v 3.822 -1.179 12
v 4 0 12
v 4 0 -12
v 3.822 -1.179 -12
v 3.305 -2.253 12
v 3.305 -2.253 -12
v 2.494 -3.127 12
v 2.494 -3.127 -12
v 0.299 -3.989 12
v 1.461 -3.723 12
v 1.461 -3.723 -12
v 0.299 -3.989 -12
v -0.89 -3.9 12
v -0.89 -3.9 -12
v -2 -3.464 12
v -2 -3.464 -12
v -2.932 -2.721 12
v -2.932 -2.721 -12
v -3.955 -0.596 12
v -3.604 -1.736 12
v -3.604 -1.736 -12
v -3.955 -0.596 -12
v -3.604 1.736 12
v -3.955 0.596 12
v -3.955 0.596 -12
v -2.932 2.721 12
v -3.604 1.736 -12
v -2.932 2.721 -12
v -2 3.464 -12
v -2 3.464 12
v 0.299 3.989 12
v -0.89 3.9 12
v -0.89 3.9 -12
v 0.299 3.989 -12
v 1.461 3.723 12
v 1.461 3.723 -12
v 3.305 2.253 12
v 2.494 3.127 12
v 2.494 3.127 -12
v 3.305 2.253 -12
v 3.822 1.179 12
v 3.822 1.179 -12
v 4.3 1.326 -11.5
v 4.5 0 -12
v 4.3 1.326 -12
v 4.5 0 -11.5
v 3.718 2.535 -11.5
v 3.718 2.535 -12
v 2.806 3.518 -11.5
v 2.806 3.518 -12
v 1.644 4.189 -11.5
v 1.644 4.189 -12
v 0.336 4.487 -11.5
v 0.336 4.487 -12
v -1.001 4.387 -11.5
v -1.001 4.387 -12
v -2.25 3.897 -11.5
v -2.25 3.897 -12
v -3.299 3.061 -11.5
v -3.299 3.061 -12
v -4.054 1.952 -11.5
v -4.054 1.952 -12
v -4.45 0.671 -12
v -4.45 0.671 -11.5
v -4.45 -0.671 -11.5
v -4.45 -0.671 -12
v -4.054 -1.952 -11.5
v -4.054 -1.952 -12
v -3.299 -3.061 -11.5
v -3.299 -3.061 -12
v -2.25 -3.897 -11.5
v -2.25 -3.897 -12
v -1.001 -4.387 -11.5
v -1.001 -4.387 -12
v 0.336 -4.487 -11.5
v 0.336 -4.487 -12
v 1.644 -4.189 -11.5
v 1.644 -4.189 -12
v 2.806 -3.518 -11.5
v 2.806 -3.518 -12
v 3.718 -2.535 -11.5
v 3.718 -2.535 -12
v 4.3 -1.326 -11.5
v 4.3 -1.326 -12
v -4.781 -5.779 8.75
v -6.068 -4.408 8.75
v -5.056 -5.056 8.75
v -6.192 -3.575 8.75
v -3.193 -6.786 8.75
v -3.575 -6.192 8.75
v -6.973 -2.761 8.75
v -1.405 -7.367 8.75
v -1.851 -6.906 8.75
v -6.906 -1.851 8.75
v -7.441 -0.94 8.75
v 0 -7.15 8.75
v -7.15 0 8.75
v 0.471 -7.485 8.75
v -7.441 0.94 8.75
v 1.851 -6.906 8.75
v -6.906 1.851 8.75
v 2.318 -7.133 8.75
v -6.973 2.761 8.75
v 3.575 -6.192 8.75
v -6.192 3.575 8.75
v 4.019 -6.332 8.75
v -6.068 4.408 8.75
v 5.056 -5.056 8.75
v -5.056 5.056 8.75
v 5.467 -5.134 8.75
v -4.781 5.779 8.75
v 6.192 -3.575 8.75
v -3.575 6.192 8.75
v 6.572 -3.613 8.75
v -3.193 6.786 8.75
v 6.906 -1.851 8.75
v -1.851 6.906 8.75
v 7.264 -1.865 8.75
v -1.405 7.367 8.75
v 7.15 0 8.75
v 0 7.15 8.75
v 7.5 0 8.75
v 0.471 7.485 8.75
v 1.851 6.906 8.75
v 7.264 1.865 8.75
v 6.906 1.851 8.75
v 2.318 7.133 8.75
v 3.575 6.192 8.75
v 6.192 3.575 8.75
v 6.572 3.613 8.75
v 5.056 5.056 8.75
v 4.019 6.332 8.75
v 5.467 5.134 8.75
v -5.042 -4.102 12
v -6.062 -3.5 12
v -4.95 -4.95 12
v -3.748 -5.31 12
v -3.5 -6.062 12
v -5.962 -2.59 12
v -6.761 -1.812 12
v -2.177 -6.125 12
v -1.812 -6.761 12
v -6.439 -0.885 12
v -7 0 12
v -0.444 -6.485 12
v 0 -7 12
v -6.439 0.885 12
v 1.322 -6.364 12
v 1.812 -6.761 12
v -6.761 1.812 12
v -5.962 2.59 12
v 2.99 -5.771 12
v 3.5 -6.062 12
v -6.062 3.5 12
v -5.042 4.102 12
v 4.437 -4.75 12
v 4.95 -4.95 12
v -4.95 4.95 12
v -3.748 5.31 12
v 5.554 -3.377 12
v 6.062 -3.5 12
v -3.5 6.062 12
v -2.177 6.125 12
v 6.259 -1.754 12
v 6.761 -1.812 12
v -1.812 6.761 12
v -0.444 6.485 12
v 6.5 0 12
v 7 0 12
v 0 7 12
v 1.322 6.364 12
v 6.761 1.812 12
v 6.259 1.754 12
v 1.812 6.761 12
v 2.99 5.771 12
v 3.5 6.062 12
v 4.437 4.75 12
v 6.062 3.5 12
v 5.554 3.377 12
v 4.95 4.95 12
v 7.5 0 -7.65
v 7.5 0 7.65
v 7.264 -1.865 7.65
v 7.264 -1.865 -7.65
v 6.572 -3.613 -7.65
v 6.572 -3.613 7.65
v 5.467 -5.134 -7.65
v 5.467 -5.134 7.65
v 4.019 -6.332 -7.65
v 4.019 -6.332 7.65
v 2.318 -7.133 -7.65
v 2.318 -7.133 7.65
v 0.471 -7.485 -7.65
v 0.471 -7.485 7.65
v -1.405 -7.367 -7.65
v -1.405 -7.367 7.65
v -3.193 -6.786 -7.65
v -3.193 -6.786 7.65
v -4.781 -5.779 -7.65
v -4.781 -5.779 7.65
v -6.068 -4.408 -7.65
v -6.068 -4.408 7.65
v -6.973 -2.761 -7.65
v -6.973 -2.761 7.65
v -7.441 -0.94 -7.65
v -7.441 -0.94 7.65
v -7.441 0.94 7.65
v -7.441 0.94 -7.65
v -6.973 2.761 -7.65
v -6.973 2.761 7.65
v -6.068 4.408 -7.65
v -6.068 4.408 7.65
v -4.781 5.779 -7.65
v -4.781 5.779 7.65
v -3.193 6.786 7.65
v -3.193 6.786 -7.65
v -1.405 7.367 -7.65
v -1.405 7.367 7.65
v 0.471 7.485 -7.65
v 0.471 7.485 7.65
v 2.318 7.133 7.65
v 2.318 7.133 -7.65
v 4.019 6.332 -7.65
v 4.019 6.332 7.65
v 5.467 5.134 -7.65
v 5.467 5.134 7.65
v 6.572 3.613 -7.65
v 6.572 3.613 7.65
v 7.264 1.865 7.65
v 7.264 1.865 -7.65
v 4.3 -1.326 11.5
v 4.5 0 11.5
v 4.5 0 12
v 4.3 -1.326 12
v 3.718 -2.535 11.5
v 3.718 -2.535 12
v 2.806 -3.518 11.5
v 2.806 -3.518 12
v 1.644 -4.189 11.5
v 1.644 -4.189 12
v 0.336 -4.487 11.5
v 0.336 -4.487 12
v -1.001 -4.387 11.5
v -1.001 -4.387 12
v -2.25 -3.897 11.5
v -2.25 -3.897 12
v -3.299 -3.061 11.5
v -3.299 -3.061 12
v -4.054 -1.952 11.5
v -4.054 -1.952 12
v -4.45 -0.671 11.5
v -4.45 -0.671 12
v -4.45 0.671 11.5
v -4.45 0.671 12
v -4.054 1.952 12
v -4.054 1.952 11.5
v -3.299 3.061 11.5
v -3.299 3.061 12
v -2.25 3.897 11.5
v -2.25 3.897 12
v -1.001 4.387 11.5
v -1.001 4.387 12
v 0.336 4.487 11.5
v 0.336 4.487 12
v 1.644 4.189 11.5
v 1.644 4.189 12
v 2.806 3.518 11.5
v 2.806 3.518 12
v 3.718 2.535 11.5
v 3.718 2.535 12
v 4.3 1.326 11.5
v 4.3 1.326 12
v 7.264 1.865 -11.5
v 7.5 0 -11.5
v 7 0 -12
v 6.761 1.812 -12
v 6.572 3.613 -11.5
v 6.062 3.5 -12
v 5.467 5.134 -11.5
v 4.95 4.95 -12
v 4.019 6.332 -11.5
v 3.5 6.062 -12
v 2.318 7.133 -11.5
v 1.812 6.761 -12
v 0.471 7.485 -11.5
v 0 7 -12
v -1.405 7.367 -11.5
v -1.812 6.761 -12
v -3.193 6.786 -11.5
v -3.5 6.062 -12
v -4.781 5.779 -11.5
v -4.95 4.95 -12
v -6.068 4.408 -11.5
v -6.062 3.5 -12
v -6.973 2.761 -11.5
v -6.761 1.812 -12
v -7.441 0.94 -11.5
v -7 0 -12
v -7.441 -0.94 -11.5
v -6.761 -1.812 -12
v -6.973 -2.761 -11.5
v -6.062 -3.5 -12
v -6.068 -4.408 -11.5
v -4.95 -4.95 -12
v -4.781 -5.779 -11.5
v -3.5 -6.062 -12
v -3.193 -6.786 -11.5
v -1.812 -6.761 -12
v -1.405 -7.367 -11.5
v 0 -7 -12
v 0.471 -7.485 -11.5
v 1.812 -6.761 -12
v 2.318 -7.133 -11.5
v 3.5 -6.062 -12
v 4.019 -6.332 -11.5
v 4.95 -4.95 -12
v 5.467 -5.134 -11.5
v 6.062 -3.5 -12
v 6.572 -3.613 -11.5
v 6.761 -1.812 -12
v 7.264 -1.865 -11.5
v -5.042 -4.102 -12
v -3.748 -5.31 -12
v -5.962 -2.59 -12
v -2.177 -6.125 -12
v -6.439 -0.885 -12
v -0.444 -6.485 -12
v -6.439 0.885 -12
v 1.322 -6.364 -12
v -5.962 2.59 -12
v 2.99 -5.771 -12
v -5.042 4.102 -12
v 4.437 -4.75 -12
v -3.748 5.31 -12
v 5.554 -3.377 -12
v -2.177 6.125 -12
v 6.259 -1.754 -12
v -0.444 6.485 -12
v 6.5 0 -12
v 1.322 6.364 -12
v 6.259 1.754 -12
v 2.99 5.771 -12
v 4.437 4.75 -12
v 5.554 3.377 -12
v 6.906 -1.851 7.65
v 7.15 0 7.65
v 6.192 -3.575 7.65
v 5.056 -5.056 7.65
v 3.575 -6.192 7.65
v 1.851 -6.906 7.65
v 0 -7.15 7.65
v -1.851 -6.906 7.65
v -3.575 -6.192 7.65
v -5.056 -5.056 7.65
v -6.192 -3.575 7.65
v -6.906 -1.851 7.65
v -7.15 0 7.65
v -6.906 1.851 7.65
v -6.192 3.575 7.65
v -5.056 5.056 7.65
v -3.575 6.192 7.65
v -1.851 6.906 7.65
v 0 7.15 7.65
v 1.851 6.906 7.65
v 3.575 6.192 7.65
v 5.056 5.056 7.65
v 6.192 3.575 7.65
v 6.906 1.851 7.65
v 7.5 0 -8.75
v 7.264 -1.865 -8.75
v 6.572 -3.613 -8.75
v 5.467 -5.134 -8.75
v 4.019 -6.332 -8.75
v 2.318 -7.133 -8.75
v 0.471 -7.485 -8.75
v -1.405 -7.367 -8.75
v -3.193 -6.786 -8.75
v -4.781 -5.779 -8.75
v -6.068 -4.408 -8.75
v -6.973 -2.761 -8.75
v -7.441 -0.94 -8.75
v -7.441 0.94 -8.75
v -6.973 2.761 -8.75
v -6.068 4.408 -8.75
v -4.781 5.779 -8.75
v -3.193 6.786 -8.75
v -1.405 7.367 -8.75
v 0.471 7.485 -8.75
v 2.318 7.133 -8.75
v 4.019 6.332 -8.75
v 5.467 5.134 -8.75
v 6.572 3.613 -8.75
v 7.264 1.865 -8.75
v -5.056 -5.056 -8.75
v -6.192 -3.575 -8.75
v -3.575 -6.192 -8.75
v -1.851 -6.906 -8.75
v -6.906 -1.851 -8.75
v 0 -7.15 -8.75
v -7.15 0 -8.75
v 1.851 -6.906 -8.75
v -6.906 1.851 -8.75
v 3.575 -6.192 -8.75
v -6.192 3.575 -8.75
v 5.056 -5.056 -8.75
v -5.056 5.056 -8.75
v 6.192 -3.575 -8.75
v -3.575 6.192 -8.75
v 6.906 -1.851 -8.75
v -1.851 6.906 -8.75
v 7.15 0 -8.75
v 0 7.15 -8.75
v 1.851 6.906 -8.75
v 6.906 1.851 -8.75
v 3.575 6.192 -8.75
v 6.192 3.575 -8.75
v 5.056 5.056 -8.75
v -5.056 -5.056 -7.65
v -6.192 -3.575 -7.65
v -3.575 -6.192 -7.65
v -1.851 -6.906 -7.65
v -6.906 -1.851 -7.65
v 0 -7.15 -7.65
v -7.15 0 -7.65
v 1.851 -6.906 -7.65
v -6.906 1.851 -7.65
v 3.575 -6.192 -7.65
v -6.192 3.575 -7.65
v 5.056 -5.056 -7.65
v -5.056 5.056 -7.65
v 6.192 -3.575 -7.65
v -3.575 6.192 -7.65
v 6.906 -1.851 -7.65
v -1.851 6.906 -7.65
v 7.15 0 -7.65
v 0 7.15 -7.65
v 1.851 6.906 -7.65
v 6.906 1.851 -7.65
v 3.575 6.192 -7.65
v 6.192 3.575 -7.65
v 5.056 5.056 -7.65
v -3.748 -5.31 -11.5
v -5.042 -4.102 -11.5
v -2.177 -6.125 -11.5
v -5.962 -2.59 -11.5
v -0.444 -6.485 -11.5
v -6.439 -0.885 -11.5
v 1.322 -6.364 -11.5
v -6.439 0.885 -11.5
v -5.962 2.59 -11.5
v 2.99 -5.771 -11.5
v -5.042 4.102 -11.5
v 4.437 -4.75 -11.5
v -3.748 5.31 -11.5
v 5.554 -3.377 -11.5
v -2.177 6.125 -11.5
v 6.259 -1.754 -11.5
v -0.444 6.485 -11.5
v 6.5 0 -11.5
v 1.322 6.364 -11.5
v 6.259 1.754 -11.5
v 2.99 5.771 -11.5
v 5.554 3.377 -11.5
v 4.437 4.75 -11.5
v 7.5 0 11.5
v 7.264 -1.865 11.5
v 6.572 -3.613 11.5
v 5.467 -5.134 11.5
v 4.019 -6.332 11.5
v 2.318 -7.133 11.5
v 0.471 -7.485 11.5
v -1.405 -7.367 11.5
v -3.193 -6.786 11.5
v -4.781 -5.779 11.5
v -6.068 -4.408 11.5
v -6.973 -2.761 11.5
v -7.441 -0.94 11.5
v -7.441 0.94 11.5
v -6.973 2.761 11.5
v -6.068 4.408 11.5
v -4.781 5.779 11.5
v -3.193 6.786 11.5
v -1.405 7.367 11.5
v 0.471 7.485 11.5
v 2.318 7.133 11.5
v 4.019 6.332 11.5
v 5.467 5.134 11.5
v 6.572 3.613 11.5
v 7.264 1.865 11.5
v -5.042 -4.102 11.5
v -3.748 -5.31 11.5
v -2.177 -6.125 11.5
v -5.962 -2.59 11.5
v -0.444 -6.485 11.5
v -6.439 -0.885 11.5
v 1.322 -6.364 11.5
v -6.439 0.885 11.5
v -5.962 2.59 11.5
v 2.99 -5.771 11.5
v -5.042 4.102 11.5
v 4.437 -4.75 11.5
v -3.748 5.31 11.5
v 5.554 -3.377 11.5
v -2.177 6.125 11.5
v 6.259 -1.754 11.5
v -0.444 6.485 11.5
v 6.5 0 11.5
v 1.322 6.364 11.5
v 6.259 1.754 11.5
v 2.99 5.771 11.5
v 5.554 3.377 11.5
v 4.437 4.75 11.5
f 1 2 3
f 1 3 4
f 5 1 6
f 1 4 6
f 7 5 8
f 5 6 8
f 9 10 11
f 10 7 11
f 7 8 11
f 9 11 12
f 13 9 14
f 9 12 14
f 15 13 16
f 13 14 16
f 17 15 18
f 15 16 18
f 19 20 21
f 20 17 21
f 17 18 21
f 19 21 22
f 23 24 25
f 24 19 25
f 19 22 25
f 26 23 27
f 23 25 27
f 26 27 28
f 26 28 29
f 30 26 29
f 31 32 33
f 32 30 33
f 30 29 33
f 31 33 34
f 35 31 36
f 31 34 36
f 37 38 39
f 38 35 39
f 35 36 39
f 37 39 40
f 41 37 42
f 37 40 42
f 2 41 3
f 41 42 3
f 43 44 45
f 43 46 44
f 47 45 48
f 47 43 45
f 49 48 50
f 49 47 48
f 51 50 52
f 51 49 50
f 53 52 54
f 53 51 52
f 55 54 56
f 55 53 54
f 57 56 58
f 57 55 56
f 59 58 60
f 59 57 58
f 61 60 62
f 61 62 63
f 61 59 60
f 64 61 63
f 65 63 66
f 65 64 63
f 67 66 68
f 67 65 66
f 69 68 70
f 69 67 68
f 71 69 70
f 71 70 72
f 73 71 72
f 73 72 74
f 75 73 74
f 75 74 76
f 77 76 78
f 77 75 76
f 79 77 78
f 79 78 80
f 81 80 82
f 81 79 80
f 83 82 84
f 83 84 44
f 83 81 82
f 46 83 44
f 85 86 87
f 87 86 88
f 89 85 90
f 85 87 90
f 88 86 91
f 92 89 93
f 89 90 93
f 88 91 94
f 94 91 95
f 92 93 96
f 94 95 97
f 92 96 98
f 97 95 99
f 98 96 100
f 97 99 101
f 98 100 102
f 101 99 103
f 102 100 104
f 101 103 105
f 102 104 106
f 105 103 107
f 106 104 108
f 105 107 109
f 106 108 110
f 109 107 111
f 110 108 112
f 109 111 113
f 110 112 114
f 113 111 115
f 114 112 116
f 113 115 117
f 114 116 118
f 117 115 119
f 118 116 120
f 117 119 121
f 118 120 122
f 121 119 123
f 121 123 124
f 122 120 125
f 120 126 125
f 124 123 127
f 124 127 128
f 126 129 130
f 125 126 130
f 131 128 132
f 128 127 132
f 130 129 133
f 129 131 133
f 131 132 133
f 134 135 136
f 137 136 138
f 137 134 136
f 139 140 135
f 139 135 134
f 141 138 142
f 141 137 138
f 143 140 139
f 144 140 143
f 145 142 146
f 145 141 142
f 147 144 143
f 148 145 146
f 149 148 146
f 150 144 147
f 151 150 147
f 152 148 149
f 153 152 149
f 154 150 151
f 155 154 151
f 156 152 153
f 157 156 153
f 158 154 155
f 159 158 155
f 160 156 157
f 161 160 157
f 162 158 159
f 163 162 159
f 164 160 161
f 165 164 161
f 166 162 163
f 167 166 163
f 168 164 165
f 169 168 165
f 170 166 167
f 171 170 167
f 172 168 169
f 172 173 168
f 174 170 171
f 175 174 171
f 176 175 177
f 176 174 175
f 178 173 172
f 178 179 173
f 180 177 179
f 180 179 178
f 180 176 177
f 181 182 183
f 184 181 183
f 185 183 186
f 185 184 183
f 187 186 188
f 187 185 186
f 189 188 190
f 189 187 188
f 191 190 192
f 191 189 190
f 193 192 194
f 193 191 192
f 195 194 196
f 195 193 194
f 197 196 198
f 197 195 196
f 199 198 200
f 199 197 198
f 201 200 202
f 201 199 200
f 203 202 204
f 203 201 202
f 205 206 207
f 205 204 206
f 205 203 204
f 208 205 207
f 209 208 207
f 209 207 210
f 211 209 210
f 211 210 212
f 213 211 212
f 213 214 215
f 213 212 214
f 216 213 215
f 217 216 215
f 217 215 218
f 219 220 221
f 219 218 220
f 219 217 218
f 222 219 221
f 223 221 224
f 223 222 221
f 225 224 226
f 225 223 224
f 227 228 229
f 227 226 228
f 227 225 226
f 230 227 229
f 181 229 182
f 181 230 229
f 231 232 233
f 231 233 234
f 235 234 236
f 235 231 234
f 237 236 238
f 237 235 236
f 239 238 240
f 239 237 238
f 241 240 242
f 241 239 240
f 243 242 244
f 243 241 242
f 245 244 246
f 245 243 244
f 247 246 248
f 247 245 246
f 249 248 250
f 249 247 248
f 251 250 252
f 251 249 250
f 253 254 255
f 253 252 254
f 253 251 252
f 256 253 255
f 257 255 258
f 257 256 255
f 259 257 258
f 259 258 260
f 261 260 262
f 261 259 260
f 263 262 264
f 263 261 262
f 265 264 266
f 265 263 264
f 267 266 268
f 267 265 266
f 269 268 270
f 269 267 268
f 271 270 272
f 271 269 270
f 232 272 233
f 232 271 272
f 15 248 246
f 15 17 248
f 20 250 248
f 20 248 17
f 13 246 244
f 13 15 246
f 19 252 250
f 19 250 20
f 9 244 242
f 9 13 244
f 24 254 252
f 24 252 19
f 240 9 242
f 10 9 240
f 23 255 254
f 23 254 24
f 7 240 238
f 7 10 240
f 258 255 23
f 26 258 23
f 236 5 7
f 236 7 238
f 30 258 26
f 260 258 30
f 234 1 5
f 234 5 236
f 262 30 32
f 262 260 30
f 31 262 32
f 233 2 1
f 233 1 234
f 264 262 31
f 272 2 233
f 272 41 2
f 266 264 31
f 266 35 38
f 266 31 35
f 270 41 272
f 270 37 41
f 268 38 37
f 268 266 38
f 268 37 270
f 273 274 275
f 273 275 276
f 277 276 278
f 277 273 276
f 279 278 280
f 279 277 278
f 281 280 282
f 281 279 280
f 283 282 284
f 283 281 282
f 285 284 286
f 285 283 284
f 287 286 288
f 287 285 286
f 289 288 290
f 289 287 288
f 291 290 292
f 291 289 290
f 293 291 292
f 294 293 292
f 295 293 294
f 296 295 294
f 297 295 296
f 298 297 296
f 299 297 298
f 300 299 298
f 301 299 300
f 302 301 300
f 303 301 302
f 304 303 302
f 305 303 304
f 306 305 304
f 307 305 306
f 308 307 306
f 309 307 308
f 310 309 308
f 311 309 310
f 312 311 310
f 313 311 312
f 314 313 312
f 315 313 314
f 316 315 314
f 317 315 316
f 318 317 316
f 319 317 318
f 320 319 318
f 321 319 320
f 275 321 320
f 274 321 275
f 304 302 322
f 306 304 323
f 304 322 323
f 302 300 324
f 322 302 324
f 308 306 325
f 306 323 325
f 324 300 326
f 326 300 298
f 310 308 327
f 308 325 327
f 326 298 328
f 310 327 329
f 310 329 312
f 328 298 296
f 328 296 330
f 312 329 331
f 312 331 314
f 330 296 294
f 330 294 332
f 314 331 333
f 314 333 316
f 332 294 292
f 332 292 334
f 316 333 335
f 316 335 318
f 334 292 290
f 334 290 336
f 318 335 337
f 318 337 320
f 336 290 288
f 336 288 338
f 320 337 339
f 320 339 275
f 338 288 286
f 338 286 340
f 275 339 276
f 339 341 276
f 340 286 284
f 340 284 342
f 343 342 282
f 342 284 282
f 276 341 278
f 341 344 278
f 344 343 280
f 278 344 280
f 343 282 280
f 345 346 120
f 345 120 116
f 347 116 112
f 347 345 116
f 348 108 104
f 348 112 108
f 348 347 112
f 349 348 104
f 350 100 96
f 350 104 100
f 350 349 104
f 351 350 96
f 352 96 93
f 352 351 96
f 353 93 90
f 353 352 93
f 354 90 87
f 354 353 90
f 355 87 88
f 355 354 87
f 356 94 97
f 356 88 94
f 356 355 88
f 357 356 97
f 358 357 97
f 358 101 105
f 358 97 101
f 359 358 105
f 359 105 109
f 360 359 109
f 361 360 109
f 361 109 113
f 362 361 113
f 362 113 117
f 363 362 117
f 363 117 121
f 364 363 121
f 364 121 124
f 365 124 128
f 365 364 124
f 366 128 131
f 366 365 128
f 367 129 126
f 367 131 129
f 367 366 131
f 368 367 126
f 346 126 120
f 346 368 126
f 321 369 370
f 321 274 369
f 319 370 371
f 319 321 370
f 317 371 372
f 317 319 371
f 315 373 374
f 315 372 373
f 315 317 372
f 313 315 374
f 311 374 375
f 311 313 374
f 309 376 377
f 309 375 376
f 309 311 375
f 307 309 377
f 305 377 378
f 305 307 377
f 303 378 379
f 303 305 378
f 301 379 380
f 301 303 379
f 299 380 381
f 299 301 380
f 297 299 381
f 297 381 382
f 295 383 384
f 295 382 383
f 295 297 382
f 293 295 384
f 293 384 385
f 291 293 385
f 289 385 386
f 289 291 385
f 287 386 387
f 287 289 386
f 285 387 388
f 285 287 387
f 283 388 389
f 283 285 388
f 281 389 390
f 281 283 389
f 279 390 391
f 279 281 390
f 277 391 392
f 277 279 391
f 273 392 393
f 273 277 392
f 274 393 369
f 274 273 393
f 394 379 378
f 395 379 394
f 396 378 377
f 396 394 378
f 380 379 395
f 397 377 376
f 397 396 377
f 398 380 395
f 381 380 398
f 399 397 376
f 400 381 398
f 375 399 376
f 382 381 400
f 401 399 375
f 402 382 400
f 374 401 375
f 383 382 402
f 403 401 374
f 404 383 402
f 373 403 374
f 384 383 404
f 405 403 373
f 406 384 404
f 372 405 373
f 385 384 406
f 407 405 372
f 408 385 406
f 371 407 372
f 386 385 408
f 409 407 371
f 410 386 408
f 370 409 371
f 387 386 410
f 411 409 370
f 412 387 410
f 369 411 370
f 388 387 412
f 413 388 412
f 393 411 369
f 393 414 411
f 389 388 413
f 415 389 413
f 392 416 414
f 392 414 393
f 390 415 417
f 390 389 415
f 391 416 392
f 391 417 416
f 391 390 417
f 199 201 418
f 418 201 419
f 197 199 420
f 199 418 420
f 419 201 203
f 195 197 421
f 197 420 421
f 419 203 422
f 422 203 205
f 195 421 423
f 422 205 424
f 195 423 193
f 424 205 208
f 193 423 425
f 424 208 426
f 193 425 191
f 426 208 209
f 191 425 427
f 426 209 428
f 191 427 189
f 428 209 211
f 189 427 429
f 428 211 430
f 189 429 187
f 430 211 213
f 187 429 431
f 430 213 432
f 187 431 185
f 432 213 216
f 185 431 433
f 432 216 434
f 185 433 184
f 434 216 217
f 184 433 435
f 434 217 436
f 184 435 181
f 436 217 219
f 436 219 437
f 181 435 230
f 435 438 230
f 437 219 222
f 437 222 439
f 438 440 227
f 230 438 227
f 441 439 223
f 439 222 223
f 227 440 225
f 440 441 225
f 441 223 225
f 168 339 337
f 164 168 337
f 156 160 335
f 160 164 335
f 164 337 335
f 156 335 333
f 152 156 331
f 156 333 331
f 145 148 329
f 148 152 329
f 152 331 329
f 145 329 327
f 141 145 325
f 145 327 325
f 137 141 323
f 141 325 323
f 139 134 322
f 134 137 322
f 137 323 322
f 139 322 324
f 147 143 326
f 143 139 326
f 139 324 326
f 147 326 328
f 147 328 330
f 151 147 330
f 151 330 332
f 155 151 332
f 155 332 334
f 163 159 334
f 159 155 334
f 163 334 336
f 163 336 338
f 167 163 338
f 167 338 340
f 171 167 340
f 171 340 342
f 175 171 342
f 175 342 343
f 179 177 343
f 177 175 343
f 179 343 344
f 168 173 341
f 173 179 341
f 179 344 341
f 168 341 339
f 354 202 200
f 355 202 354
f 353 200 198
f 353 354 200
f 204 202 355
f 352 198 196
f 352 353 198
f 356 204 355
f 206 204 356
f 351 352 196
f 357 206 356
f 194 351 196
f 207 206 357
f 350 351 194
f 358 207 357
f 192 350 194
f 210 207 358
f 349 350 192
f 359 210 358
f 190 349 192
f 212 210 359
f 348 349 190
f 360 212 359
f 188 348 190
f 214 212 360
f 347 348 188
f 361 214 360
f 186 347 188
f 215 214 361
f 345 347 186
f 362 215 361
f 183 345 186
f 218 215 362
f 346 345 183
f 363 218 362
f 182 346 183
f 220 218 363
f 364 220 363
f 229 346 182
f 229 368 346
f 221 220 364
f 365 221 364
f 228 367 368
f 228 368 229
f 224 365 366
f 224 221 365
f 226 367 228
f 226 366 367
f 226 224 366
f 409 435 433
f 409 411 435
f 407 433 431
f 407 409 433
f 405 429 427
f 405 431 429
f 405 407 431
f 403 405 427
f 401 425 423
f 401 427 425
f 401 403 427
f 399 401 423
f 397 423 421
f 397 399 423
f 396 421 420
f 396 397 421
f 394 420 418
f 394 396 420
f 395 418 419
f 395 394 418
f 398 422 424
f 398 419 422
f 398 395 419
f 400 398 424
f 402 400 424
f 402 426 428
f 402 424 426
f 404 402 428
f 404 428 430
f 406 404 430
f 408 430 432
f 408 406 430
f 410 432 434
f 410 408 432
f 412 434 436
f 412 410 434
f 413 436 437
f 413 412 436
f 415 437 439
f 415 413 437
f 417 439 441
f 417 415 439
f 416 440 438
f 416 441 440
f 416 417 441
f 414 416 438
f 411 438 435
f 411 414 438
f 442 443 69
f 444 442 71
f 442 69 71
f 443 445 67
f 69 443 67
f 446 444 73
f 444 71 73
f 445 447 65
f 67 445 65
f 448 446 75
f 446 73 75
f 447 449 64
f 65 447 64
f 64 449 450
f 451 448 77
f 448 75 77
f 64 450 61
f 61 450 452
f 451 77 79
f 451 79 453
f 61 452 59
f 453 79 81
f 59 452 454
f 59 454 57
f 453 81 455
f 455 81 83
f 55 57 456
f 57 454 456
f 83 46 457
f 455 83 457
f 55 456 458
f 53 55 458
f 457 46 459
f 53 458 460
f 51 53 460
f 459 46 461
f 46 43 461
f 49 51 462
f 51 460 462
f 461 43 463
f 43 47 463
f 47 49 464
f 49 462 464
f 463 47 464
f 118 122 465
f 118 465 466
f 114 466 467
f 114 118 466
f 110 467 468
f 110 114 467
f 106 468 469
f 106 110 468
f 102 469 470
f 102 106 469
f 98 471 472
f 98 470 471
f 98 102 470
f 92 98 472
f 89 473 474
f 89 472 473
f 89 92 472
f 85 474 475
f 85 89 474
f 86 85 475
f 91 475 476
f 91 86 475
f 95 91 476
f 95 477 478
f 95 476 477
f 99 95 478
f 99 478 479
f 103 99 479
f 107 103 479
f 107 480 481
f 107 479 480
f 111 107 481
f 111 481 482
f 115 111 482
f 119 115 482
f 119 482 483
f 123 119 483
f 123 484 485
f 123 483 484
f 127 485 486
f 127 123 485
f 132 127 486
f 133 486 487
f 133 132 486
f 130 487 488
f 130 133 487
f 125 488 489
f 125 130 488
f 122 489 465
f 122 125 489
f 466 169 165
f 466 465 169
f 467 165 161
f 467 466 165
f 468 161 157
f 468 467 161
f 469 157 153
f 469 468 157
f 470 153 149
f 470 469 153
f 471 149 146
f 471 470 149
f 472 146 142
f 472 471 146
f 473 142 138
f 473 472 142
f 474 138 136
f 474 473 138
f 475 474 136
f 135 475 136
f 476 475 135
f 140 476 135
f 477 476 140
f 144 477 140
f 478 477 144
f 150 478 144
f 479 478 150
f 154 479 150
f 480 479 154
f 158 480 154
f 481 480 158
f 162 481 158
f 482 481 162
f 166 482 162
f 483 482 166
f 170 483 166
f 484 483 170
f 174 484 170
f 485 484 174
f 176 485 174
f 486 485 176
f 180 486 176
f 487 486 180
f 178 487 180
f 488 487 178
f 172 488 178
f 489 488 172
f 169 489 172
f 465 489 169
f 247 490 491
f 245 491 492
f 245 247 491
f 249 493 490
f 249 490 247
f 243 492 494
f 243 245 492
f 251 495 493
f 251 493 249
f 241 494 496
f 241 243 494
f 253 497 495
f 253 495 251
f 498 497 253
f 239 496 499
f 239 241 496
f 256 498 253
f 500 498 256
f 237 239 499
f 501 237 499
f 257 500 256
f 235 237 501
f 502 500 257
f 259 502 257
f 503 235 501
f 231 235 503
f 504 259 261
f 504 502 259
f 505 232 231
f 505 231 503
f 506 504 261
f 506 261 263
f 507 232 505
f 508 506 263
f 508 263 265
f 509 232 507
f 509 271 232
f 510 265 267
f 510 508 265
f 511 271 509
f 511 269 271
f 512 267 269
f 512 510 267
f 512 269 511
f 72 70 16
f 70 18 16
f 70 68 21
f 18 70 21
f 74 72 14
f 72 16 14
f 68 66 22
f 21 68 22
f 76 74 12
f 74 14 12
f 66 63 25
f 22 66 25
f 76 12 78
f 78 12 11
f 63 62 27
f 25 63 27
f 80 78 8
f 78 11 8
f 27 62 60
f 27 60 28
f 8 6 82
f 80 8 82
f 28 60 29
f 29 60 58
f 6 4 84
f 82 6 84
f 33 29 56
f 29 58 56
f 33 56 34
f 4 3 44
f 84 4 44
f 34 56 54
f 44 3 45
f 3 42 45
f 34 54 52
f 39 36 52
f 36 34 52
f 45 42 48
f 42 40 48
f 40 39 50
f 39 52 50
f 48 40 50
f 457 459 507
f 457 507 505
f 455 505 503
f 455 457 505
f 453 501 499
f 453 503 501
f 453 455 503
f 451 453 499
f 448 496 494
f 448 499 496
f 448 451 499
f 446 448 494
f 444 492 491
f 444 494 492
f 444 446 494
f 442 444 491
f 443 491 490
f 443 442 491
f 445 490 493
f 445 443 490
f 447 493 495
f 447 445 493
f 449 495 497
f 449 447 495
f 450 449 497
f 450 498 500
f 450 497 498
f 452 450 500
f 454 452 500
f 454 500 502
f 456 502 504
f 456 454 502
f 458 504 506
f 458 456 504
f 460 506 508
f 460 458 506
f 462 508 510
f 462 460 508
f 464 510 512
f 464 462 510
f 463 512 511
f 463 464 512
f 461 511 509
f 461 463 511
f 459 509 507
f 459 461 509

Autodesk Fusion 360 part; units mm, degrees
sketch "スケッチ1" plane through (0, 0, 0) normal (0, 1, 0) x (1, 0, 0)
  line L0 (0, 0) -> (0, -12)
  line L1 (0, -12) -> (7.5, -12)
  line L2 (7.5, -12) -> (7.5, -8.75)
  line L3 (7.5, -8.75) -> (7.15, -8.75)
  line L4 (7.15, -8.75) -> (7.15, -7.65)
  line L5 (7.15, -7.65) -> (7.5, -7.65)
  line L6 (7.5, -7.65) -> (7.5, 7.65)
  line L7 (7.5, 7.65) -> (7.15, 7.65)
  line L8 (7.15, 7.65) -> (7.15, 8.75)
  line L9 (7.15, 8.75) -> (7.5, 8.75)
  line L10 (7.5, 8.75) -> (7.5, 12)
  line L11 (7.5, 12) -> (0, 12)
  line L12 (0, 12) -> (0, 0)
  line L13 (6.5, -12) -> (6.5, 12)
  line L14 (4.5, -12) -> (4.5, -11.5)
  line L15 (4.5, -11.5) -> (6.5, -11.5)
  line L16 (4, -12) -> (4, 12)
  line L17 (4.5, 12) -> (4.5, 11.5)
  line L18 (4.5, 11.5) -> (6.5, 11.5)
  dimension "d1" = 7.5
  dimension "d2" = 12
  dimension "d3" = 12
  dimension "d4" = 7.15
  dimension "d5" = 3.25
  dimension "d6" = 1.1
  dimension "d7" = 3.25
  dimension "d8" = 1.1
  dimension "d9" = 6.5
  dimension "d10" = 4
  dimension "d11" = 0.5
  dimension "d12" = 0.5
  dimension "d13" = 0.5
revolve "回転1" add sketch "スケッチ1" angle 360 about axis through (0, 0, 0) along (0, 0, 1) contours L1 L11 L13 L14 L15 L16 L17 L18 makes body 1
revolve "回転2" add sketch "スケッチ1" angle 360 about axis through (0, 0, 1.75) along (0, 0, 1) separate body contours L1 L2 L3 L4 L5 L6 L7 L8 L9 L10 L11 L13 makes body 2
chamfer "面取り1" distance 0.5 angle 45 2 edges at (-6.9925, -2.7121, 12) (-6.9925, -2.7121, -12) on bodies 2
equation "d3 = d2"
equation "d7 = d5"
equation "d8 = d6"
equation "d13 = d12"
